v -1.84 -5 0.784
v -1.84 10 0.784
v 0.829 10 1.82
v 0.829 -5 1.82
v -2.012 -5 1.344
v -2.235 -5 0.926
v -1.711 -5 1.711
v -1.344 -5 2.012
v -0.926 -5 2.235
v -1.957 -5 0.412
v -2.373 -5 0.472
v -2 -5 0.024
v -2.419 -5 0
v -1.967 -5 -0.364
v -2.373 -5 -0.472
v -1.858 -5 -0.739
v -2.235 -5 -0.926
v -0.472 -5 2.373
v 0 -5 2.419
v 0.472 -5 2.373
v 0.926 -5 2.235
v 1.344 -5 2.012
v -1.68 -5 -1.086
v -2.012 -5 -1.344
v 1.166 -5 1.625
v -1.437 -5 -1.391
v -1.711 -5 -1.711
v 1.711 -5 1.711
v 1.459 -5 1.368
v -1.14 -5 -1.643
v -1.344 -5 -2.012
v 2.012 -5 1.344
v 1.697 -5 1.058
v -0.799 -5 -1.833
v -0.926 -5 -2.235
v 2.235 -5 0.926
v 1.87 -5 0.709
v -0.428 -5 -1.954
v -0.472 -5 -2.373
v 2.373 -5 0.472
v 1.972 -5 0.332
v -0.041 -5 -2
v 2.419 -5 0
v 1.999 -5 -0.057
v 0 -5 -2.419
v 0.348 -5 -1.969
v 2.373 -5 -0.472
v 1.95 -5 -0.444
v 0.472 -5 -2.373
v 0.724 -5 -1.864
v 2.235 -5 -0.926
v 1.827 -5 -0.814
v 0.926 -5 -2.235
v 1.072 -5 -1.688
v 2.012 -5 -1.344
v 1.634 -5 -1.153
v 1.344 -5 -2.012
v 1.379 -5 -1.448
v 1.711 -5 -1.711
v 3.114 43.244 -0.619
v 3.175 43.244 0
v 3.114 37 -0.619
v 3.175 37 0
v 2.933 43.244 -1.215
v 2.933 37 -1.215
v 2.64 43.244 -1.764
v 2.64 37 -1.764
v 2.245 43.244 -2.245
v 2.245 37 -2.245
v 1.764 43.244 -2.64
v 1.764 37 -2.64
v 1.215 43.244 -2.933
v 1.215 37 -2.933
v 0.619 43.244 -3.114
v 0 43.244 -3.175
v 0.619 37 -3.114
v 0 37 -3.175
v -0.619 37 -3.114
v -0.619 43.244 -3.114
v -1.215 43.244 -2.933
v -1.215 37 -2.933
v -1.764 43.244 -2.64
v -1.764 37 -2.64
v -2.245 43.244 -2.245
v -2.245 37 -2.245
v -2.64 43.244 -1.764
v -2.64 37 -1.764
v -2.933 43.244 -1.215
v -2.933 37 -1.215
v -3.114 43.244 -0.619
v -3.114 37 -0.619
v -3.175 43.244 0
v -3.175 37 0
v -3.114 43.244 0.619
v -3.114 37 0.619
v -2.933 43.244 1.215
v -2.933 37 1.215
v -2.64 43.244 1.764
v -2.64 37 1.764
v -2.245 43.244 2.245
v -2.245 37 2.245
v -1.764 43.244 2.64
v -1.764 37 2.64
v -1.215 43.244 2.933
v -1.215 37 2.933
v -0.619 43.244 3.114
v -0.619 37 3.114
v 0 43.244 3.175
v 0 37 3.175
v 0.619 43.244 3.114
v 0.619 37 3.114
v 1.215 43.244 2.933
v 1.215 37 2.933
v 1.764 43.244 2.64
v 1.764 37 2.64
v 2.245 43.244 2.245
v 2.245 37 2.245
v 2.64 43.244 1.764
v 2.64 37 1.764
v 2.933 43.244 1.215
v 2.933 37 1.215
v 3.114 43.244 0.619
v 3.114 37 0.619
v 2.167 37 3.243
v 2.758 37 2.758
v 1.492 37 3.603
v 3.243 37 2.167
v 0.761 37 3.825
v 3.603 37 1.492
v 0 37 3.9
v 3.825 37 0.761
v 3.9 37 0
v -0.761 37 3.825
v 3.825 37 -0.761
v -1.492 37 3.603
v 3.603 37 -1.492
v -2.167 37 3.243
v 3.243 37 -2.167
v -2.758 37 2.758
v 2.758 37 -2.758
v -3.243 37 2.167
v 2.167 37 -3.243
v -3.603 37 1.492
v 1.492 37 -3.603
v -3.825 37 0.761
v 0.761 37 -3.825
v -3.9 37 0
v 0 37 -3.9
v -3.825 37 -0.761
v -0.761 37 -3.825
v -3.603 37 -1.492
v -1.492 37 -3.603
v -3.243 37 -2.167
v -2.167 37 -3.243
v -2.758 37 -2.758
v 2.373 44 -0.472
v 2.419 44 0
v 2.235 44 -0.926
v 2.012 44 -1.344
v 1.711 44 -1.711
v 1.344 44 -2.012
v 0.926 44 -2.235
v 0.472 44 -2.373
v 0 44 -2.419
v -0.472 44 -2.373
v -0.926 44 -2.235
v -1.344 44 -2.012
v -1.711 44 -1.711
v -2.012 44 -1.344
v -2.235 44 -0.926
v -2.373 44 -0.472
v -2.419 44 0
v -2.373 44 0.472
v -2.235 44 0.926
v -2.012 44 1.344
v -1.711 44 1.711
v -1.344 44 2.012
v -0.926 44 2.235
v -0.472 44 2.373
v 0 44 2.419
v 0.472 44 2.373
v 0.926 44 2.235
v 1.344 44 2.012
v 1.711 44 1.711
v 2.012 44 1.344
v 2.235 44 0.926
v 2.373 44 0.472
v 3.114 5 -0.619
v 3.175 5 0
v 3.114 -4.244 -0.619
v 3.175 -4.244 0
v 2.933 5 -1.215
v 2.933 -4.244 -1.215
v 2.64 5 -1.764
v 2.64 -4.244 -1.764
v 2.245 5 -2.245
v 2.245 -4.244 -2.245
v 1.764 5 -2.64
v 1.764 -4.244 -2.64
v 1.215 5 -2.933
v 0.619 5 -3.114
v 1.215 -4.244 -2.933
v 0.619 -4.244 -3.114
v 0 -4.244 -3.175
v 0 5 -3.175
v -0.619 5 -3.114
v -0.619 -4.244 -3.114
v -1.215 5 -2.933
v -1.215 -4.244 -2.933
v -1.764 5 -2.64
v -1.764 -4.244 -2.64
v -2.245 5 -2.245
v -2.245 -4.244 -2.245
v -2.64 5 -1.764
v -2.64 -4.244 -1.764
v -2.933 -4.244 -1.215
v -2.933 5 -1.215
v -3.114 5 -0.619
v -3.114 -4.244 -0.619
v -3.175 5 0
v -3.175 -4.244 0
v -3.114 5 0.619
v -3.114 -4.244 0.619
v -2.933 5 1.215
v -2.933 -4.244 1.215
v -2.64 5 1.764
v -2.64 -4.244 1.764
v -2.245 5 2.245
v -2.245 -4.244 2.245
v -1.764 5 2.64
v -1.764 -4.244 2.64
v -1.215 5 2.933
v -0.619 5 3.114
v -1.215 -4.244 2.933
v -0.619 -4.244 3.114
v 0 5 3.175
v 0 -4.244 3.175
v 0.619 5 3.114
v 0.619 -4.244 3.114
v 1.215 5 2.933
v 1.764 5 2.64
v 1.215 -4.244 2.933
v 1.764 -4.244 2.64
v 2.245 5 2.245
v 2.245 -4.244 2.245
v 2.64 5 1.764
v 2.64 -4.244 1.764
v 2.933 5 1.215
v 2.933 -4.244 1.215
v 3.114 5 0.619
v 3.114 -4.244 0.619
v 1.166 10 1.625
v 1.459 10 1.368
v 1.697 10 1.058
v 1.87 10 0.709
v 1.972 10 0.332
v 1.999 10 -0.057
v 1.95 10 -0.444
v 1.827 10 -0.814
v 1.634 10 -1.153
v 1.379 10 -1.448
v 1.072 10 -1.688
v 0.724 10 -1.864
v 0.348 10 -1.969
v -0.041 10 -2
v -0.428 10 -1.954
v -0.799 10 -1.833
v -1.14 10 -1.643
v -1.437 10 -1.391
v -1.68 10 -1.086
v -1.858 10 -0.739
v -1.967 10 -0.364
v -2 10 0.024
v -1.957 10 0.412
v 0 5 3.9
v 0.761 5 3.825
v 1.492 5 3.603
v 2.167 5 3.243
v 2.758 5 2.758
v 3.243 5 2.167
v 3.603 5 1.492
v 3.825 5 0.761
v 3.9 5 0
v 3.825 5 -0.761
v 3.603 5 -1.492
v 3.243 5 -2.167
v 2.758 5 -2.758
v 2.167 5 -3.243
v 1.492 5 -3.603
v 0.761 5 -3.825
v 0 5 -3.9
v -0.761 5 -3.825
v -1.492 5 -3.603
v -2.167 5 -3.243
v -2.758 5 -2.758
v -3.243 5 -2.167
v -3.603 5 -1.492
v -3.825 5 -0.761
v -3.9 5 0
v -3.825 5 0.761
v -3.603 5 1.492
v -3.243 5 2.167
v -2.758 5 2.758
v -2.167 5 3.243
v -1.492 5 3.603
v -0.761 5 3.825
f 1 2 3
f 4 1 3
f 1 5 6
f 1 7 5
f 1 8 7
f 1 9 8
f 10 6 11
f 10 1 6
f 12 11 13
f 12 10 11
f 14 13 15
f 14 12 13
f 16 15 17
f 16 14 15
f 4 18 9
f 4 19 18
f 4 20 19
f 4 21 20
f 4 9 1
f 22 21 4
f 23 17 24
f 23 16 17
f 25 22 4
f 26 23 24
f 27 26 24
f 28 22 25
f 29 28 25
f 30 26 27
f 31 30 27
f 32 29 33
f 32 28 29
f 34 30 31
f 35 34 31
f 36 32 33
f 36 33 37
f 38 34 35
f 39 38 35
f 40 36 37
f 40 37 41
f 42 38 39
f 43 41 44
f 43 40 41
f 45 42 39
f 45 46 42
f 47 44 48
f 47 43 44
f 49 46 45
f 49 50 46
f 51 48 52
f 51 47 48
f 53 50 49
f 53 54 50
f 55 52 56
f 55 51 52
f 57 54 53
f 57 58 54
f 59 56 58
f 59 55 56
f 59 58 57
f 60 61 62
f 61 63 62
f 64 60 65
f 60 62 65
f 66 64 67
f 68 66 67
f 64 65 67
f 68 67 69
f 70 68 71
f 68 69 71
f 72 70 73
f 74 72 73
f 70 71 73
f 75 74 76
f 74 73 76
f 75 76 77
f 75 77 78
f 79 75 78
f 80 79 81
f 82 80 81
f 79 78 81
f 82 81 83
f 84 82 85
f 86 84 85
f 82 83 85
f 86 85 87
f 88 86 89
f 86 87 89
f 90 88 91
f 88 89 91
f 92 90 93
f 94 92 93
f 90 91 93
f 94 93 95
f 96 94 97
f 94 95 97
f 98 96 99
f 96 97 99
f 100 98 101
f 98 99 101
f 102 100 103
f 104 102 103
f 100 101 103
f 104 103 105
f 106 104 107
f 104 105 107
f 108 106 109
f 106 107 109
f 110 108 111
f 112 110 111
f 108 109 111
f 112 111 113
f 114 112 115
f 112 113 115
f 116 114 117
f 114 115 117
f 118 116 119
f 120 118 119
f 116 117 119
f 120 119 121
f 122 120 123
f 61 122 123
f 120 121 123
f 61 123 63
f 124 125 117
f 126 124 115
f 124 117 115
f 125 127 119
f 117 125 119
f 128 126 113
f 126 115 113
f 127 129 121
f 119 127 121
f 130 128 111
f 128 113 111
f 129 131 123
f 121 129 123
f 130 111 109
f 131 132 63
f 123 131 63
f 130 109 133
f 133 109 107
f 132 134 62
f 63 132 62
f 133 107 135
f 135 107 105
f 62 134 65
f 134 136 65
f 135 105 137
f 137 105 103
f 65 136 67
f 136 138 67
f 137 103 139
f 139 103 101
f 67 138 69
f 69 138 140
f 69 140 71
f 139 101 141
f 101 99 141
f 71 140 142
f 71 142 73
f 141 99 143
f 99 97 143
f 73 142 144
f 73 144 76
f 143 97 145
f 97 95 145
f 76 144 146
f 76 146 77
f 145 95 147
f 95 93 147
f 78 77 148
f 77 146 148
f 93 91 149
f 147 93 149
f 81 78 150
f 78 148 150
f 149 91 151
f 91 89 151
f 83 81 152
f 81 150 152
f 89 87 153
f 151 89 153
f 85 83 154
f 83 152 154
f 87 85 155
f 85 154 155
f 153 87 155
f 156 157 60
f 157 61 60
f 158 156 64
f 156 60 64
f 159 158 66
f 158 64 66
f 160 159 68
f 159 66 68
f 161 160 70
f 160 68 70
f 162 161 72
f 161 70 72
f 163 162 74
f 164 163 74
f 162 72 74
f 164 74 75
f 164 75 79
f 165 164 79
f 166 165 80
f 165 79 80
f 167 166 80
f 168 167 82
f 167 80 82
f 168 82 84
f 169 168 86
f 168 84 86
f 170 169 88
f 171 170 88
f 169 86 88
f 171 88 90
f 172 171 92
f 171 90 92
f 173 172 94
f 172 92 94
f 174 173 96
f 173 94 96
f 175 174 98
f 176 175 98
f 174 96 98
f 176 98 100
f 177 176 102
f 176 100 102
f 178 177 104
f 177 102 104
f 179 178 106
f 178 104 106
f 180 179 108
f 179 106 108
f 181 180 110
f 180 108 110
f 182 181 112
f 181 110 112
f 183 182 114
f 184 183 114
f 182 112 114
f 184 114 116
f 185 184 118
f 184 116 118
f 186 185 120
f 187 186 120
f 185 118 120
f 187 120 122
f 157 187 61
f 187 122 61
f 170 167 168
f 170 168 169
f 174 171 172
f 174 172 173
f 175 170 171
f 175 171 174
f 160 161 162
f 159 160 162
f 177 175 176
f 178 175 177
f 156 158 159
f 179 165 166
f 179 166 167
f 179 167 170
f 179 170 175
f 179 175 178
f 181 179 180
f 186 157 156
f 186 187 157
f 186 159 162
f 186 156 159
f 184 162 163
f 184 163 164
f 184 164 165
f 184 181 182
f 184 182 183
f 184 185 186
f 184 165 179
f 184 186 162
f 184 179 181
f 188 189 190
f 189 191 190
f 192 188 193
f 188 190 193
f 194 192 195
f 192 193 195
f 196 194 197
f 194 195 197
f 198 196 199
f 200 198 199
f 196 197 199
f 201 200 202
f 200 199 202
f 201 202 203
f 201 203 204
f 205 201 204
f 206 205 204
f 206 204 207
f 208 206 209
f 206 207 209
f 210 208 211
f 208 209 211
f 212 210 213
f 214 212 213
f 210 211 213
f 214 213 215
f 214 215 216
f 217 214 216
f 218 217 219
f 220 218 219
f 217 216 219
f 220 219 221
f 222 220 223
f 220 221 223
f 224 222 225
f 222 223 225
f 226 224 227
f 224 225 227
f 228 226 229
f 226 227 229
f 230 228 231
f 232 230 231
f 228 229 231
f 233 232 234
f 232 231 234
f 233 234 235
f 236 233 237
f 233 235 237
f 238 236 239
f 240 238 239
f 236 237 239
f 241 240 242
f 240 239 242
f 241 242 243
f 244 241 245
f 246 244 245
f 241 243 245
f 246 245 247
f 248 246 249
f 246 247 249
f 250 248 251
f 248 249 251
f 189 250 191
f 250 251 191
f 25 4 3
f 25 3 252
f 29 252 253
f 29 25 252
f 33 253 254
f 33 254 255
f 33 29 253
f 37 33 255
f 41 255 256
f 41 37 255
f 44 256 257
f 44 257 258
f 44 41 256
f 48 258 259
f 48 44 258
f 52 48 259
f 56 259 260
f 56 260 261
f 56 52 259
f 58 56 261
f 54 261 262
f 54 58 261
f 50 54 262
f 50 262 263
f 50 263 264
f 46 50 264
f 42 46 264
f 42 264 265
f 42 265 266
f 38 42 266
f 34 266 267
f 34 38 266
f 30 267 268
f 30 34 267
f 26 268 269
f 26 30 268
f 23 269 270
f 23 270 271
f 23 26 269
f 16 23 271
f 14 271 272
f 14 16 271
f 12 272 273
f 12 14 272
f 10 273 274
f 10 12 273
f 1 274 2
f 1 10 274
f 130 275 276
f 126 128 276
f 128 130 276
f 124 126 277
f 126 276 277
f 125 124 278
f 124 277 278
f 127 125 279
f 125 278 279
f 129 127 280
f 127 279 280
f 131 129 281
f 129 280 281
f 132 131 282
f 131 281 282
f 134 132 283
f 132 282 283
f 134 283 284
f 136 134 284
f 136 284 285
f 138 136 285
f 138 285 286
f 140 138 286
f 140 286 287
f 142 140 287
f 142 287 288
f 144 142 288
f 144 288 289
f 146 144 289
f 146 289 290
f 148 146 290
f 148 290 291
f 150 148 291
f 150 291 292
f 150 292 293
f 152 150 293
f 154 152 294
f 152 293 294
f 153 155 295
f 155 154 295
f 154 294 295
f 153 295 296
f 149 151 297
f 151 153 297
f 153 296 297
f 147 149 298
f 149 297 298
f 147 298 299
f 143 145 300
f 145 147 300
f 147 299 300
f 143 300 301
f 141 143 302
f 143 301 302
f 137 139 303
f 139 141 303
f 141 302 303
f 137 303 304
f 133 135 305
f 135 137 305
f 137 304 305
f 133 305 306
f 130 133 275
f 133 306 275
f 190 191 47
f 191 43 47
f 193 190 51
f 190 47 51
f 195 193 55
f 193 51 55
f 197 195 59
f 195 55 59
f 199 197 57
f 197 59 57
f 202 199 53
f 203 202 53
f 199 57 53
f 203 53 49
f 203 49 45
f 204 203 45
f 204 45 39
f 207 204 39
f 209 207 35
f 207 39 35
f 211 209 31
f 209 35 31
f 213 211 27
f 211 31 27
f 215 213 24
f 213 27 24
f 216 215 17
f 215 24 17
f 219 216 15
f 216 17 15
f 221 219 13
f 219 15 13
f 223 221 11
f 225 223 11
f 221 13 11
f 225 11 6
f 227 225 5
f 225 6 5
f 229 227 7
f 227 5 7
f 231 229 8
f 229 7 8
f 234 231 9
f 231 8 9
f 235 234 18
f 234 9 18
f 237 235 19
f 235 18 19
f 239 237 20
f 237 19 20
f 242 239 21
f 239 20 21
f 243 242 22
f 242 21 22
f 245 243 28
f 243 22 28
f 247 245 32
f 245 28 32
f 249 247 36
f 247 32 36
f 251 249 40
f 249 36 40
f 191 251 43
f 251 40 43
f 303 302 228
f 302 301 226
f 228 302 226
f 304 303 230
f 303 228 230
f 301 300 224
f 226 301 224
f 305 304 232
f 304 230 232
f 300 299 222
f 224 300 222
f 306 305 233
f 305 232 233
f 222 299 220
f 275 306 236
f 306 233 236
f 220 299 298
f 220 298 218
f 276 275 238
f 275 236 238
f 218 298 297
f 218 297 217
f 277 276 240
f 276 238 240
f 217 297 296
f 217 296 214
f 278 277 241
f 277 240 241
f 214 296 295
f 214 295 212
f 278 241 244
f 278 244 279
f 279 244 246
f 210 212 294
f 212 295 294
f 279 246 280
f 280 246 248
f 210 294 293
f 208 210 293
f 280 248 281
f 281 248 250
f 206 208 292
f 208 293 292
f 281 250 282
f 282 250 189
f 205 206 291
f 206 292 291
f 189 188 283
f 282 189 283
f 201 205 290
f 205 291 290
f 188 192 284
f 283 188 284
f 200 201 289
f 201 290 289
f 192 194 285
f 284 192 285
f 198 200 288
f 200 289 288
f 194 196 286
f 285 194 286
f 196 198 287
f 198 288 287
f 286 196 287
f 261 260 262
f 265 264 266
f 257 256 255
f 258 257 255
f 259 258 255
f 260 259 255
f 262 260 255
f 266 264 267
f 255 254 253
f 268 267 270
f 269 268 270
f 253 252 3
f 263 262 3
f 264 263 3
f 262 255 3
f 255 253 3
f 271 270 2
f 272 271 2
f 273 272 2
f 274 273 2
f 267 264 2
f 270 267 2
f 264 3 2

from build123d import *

# Parameters (mm, degrees)
SKETCH1_R           = 3.9
BOSS_EXTRUDE1_DEPTH = 44
BOSS_EXTRUDE2_START = 5
SKETCH6_R           = 3.9
BOSS_EXTRUDE2_DEPTH = 5
CUT_EXTRUDE1_DEPTH  = 8
CUT_EXTRUDE2_DEPTH  = 15


# Read off the part's stored shape, not the designer's step: 1/4-20 Machine Threads Stud2, 1/4-20 Machine Threads Stud4
with BuildPart() as part:
    # Sketch1 → Boss-Extrude1 (new body)
    with BuildSketch(Plane(origin=(0, 0, 0), x_dir=(1, 0, 0), z_dir=(0, 1, 0))):
        with Locations(Location((0, 0, 0), (0, 0, 270))):
            Circle(SKETCH1_R)
    extrude(amount=BOSS_EXTRUDE1_DEPTH)

    # 1/4-20 Machine Threads Stud2 outline → 1/4-20 Machine Threads Stud2 (revolve, cut)
    with BuildSketch(Plane.XY):
        Polygon((3.9, 44), (2.41935, 44), (3.175, 43.24435), (3.175, 37), (3.9, 37), align=None)
    revolve(axis=Axis((0, 0, 0), (0, 1, 0)), mode=Mode.SUBTRACT)

    # Sketch6 → Boss-Extrude2 (add)
    with BuildSketch(Plane.XZ.offset(BOSS_EXTRUDE2_START)):
        with Locations(Location((0, 0, 0), (0, 0, 270))):
            Circle(SKETCH6_R)
    extrude(amount=-BOSS_EXTRUDE2_DEPTH)

    # 1/4-20 Machine Threads Stud4 outline → 1/4-20 Machine Threads Stud4 (revolve, cut)
    with BuildSketch(Plane.XY):
        Polygon((2.41935, -5), (3.9, -5), (3.9, 5), (3.175, 5), (3.175, -4.24435), align=None)
    revolve(axis=Axis((0, 0, 0), (0, 1, 0)), mode=Mode.SUBTRACT)

    # Sketch10 → Cut-Extrude1 (cut)
    with BuildSketch(Plane.XZ.offset(5)):
        with BuildLine():
            Line((-1.269821024, 0.798470142), (1.269821024, 0.798470142))
            ThreePointArc((1.269821024, 0.798470142), (0, -1.5), (-1.269821024, 0.798470142))
        make_face()
    extrude(amount=-CUT_EXTRUDE1_DEPTH, mode=Mode.SUBTRACT)

    # Sketch11 → Cut-Extrude2 (cut)
    with BuildSketch(Plane.XZ.offset(5)):
        with BuildLine():
            Line((-1.839869815, 0.784142248), (0.828669593, 1.820249078))
            ThreePointArc((0.828669593, 1.820249078), (0.723885911, -1.86440049), (-1.839869815, 0.784142248))
        make_face()
    extrude(amount=-CUT_EXTRUDE2_DEPTH, mode=Mode.SUBTRACT)


solid = part.part
